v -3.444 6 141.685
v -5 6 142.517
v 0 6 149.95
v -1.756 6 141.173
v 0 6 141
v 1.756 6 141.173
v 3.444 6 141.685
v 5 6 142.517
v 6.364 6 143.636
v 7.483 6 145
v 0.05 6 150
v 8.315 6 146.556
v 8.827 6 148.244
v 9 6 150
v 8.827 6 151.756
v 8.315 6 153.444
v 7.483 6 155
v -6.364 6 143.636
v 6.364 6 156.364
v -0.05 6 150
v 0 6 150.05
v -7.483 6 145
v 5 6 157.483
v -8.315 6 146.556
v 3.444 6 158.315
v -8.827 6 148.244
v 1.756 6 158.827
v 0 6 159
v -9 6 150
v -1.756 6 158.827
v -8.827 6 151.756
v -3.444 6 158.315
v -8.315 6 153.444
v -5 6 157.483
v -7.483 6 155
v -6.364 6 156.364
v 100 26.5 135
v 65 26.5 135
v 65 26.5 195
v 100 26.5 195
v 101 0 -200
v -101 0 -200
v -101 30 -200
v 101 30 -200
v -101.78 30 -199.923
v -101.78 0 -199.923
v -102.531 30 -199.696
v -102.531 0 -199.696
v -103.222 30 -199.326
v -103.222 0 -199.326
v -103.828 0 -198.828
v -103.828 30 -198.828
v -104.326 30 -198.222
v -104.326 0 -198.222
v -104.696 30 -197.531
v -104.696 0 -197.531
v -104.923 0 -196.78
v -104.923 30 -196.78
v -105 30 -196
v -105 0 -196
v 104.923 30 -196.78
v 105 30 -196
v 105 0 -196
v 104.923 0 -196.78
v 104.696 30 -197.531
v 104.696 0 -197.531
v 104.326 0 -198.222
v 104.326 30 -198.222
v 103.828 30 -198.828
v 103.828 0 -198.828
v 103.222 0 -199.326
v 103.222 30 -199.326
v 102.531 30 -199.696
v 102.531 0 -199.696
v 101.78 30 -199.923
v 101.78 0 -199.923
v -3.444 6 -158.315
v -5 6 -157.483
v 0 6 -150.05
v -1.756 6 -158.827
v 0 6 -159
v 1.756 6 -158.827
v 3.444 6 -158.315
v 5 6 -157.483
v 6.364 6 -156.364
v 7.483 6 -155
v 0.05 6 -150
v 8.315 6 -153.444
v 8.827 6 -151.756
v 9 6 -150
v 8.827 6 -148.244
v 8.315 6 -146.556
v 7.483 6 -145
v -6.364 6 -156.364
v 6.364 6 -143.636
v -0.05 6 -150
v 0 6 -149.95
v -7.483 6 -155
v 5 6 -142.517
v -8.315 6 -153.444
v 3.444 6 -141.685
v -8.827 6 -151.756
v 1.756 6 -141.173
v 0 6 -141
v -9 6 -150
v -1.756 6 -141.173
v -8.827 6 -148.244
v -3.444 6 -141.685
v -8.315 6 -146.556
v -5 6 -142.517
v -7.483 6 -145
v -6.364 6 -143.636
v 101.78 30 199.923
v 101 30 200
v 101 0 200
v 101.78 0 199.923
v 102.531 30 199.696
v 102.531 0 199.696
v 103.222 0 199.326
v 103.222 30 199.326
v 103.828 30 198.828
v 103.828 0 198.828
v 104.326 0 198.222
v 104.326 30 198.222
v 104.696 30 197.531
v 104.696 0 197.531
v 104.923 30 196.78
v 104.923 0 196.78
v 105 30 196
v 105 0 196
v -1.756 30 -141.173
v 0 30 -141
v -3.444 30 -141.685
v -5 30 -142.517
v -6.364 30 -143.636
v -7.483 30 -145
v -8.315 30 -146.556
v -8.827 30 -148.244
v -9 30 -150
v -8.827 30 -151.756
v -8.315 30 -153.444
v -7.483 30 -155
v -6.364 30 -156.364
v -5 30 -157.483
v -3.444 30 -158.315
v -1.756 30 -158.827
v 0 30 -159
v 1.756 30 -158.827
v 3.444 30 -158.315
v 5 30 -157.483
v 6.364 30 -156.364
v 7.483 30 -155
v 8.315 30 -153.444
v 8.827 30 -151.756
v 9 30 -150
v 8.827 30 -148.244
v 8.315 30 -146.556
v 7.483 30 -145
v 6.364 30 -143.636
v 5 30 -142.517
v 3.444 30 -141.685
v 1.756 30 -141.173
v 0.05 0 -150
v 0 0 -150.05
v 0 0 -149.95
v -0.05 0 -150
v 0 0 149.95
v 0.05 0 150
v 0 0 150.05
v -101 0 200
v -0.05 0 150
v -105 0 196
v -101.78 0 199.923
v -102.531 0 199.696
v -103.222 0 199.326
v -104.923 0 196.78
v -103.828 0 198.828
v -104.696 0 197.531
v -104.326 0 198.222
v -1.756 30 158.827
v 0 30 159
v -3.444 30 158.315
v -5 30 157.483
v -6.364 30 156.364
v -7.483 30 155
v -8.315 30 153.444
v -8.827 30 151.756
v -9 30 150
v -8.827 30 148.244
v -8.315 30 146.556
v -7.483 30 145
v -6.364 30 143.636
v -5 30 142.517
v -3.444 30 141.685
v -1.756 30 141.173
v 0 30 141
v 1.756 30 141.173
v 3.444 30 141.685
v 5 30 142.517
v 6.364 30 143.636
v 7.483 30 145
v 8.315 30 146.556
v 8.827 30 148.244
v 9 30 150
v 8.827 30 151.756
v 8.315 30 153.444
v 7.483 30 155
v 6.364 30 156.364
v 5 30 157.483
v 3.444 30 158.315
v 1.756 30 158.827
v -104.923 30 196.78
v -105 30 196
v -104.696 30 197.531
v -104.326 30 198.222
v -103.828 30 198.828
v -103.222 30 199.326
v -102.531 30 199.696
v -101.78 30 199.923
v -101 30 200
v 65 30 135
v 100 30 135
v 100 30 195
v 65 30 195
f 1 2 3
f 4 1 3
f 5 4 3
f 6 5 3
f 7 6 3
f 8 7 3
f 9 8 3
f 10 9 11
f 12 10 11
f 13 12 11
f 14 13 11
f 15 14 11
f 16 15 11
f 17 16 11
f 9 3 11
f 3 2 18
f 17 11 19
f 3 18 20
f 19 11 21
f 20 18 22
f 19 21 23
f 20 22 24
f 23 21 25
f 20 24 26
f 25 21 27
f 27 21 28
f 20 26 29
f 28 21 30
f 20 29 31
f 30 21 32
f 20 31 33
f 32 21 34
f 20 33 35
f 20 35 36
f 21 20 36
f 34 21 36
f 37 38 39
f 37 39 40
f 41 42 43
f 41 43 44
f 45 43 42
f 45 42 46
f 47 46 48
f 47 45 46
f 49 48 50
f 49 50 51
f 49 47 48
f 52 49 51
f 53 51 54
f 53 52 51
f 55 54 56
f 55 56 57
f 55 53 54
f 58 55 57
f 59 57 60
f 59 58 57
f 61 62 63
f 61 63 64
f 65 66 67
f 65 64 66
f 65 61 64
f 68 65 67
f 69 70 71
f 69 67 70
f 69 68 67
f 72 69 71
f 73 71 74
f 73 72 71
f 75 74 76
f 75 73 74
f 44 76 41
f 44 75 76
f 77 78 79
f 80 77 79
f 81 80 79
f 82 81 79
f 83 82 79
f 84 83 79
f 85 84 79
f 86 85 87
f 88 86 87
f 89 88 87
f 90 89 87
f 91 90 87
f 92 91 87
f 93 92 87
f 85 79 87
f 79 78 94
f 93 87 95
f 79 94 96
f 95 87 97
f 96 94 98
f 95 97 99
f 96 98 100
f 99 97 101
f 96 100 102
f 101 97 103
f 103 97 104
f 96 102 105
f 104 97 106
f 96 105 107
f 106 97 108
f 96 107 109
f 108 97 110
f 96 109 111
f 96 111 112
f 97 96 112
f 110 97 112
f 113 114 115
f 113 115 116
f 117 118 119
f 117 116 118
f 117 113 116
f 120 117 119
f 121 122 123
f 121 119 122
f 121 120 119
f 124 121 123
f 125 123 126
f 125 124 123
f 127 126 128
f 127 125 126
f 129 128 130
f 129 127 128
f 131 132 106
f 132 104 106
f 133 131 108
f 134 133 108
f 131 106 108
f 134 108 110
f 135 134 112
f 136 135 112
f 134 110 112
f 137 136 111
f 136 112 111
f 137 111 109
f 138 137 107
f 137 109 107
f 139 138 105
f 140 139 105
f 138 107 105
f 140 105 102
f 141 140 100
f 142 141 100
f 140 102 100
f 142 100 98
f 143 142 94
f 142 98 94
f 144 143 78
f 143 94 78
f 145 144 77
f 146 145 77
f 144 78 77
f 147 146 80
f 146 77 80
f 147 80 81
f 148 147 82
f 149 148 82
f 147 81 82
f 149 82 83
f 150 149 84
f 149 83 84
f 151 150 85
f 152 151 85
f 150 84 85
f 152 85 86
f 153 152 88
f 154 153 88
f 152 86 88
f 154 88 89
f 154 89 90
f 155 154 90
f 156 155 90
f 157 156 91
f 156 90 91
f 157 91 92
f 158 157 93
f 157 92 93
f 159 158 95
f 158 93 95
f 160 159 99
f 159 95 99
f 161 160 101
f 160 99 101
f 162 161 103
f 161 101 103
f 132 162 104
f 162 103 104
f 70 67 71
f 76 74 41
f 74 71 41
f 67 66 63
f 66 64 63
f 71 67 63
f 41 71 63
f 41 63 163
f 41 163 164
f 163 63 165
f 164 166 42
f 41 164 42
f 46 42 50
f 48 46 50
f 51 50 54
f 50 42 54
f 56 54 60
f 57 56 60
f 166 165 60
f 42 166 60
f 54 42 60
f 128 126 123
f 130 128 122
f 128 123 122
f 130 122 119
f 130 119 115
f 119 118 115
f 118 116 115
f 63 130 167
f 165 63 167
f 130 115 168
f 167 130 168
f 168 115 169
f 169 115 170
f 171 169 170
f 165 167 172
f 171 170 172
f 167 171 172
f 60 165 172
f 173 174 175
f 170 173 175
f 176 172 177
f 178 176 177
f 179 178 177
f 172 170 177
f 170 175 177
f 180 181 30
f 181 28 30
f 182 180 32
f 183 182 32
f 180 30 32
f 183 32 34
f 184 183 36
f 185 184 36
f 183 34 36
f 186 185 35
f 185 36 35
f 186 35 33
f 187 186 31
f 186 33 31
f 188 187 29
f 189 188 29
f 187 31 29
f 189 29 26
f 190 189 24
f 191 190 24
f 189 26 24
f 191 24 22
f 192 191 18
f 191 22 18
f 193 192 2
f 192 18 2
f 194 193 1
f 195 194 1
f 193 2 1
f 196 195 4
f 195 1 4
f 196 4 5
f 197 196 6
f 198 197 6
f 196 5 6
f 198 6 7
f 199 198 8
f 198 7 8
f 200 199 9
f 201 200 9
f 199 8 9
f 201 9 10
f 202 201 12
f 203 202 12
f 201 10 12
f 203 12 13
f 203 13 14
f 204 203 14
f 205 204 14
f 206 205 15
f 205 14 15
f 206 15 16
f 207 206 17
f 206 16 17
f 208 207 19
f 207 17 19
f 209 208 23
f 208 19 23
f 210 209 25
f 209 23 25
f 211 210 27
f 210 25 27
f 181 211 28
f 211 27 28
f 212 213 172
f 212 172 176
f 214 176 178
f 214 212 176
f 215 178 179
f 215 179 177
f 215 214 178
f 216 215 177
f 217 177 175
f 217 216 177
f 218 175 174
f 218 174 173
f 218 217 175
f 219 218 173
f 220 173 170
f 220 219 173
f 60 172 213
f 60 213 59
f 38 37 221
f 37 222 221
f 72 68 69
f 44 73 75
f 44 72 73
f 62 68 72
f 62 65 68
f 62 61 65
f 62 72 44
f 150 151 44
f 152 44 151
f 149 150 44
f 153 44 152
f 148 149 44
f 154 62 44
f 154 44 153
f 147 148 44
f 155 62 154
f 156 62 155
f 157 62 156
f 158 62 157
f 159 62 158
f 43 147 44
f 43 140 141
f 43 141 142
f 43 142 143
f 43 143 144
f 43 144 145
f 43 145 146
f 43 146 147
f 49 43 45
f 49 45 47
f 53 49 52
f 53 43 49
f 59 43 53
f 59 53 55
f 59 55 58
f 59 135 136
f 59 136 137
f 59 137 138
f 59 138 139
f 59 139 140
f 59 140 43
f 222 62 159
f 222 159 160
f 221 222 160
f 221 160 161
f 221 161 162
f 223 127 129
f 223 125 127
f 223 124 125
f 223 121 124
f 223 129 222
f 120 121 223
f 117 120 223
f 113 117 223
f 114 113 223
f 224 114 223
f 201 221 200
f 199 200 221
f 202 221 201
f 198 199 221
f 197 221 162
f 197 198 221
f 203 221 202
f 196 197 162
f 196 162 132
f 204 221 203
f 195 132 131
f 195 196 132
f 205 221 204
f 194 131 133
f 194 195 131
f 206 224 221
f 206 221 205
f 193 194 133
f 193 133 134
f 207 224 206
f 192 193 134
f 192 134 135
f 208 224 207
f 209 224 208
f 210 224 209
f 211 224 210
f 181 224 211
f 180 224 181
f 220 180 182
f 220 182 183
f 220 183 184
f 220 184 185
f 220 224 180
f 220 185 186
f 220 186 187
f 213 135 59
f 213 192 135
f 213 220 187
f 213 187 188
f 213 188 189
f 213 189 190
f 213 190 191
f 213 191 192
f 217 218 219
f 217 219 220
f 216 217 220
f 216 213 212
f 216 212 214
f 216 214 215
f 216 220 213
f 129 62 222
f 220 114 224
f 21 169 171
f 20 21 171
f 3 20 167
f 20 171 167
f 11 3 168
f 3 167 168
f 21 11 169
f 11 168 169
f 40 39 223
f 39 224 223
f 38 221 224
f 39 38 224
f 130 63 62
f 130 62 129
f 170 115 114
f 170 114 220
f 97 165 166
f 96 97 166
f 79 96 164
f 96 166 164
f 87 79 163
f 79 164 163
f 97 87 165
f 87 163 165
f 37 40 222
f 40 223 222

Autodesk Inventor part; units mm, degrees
ref_plane "YZ Plane" through (0, 0, 0) normal (1, 0, 0) x (0, 1, 0)
ref_plane "XZ Plane" through (0, 0, 0) normal (0, 1, 0) x (-1, 0, 0)
ref_plane "XY Plane" through (0, 0, 0) normal (0, 0, 1) x (1, 0, 0)
sketch "Sketch1" plane through (0, 0, 0) normal (0, 1, 0) x (-1, 0, 0)
  line L0 (105, -200) -> (-105, -200)
  line L1 (-105, -200) -> (-105, 200)
  line L2 (-105, 200) -> (105, 200)
  line L3 (105, 200) -> (105, -200)
  line L4 (105, -200) -> (-105, 200) construction
  line L5 (-105, -200) -> (105, 200) construction
  point P0 (0, 0)
  dimension "d0" = 210
  dimension "d1" = 400
extrude "Extrusion1" add sketch "Sketch1" along normal blind 30
sketch "Sketch2" plane through (0, 30, 0) normal (0, 1, 0) x (1, 0, 0)
  circle A0 centre (0, 150) radius 9
  circle A1 centre (0, -150) radius 9
  line L0 (-105, -200) -> (105, -200) projected
  line L1 (105, 200) -> (-105, 200) projected
  point P0 (0, 0)
  dimension "d4" = 18
  dimension "d5" = 18
  dimension "d6" = 150
  dimension "d7" = 150
  dimension "d23" = 400
hole "Hole1" at (0, 30, -150) at (0, 30, 150) direction (0, -1, 0) diameter 0.1 end through all counterbore diameter 18 counterbore depth 24
sketch "Sketch3" plane through (0, 30, 0) normal (0, 1, 0) x (1, 0, 0)
  line L0 (65, -195) -> (100, -195)
  line L1 (100, -195) -> (100, -135)
  line L2 (100, -135) -> (65, -135)
  line L3 (65, -135) -> (65, -195)
  line L4 (-105, -200) -> (105, -200) projected
  line L5 (105, -200) -> (105, 200) projected
  point P0 (0, 0)
  dimension "d15" = 35
  dimension "d16" = 60
  dimension "d17" = 5
  dimension "d19" = 5
extrude "Extrusion2" cut sketch "Sketch3" against normal blind 3.5
fillet "Fillet1" radius 4 4 edges at (105, 15, 200) (-105, 15, 200) (105, 15, -200) (-105, 15, -200)
properties part number "Podstawa"
